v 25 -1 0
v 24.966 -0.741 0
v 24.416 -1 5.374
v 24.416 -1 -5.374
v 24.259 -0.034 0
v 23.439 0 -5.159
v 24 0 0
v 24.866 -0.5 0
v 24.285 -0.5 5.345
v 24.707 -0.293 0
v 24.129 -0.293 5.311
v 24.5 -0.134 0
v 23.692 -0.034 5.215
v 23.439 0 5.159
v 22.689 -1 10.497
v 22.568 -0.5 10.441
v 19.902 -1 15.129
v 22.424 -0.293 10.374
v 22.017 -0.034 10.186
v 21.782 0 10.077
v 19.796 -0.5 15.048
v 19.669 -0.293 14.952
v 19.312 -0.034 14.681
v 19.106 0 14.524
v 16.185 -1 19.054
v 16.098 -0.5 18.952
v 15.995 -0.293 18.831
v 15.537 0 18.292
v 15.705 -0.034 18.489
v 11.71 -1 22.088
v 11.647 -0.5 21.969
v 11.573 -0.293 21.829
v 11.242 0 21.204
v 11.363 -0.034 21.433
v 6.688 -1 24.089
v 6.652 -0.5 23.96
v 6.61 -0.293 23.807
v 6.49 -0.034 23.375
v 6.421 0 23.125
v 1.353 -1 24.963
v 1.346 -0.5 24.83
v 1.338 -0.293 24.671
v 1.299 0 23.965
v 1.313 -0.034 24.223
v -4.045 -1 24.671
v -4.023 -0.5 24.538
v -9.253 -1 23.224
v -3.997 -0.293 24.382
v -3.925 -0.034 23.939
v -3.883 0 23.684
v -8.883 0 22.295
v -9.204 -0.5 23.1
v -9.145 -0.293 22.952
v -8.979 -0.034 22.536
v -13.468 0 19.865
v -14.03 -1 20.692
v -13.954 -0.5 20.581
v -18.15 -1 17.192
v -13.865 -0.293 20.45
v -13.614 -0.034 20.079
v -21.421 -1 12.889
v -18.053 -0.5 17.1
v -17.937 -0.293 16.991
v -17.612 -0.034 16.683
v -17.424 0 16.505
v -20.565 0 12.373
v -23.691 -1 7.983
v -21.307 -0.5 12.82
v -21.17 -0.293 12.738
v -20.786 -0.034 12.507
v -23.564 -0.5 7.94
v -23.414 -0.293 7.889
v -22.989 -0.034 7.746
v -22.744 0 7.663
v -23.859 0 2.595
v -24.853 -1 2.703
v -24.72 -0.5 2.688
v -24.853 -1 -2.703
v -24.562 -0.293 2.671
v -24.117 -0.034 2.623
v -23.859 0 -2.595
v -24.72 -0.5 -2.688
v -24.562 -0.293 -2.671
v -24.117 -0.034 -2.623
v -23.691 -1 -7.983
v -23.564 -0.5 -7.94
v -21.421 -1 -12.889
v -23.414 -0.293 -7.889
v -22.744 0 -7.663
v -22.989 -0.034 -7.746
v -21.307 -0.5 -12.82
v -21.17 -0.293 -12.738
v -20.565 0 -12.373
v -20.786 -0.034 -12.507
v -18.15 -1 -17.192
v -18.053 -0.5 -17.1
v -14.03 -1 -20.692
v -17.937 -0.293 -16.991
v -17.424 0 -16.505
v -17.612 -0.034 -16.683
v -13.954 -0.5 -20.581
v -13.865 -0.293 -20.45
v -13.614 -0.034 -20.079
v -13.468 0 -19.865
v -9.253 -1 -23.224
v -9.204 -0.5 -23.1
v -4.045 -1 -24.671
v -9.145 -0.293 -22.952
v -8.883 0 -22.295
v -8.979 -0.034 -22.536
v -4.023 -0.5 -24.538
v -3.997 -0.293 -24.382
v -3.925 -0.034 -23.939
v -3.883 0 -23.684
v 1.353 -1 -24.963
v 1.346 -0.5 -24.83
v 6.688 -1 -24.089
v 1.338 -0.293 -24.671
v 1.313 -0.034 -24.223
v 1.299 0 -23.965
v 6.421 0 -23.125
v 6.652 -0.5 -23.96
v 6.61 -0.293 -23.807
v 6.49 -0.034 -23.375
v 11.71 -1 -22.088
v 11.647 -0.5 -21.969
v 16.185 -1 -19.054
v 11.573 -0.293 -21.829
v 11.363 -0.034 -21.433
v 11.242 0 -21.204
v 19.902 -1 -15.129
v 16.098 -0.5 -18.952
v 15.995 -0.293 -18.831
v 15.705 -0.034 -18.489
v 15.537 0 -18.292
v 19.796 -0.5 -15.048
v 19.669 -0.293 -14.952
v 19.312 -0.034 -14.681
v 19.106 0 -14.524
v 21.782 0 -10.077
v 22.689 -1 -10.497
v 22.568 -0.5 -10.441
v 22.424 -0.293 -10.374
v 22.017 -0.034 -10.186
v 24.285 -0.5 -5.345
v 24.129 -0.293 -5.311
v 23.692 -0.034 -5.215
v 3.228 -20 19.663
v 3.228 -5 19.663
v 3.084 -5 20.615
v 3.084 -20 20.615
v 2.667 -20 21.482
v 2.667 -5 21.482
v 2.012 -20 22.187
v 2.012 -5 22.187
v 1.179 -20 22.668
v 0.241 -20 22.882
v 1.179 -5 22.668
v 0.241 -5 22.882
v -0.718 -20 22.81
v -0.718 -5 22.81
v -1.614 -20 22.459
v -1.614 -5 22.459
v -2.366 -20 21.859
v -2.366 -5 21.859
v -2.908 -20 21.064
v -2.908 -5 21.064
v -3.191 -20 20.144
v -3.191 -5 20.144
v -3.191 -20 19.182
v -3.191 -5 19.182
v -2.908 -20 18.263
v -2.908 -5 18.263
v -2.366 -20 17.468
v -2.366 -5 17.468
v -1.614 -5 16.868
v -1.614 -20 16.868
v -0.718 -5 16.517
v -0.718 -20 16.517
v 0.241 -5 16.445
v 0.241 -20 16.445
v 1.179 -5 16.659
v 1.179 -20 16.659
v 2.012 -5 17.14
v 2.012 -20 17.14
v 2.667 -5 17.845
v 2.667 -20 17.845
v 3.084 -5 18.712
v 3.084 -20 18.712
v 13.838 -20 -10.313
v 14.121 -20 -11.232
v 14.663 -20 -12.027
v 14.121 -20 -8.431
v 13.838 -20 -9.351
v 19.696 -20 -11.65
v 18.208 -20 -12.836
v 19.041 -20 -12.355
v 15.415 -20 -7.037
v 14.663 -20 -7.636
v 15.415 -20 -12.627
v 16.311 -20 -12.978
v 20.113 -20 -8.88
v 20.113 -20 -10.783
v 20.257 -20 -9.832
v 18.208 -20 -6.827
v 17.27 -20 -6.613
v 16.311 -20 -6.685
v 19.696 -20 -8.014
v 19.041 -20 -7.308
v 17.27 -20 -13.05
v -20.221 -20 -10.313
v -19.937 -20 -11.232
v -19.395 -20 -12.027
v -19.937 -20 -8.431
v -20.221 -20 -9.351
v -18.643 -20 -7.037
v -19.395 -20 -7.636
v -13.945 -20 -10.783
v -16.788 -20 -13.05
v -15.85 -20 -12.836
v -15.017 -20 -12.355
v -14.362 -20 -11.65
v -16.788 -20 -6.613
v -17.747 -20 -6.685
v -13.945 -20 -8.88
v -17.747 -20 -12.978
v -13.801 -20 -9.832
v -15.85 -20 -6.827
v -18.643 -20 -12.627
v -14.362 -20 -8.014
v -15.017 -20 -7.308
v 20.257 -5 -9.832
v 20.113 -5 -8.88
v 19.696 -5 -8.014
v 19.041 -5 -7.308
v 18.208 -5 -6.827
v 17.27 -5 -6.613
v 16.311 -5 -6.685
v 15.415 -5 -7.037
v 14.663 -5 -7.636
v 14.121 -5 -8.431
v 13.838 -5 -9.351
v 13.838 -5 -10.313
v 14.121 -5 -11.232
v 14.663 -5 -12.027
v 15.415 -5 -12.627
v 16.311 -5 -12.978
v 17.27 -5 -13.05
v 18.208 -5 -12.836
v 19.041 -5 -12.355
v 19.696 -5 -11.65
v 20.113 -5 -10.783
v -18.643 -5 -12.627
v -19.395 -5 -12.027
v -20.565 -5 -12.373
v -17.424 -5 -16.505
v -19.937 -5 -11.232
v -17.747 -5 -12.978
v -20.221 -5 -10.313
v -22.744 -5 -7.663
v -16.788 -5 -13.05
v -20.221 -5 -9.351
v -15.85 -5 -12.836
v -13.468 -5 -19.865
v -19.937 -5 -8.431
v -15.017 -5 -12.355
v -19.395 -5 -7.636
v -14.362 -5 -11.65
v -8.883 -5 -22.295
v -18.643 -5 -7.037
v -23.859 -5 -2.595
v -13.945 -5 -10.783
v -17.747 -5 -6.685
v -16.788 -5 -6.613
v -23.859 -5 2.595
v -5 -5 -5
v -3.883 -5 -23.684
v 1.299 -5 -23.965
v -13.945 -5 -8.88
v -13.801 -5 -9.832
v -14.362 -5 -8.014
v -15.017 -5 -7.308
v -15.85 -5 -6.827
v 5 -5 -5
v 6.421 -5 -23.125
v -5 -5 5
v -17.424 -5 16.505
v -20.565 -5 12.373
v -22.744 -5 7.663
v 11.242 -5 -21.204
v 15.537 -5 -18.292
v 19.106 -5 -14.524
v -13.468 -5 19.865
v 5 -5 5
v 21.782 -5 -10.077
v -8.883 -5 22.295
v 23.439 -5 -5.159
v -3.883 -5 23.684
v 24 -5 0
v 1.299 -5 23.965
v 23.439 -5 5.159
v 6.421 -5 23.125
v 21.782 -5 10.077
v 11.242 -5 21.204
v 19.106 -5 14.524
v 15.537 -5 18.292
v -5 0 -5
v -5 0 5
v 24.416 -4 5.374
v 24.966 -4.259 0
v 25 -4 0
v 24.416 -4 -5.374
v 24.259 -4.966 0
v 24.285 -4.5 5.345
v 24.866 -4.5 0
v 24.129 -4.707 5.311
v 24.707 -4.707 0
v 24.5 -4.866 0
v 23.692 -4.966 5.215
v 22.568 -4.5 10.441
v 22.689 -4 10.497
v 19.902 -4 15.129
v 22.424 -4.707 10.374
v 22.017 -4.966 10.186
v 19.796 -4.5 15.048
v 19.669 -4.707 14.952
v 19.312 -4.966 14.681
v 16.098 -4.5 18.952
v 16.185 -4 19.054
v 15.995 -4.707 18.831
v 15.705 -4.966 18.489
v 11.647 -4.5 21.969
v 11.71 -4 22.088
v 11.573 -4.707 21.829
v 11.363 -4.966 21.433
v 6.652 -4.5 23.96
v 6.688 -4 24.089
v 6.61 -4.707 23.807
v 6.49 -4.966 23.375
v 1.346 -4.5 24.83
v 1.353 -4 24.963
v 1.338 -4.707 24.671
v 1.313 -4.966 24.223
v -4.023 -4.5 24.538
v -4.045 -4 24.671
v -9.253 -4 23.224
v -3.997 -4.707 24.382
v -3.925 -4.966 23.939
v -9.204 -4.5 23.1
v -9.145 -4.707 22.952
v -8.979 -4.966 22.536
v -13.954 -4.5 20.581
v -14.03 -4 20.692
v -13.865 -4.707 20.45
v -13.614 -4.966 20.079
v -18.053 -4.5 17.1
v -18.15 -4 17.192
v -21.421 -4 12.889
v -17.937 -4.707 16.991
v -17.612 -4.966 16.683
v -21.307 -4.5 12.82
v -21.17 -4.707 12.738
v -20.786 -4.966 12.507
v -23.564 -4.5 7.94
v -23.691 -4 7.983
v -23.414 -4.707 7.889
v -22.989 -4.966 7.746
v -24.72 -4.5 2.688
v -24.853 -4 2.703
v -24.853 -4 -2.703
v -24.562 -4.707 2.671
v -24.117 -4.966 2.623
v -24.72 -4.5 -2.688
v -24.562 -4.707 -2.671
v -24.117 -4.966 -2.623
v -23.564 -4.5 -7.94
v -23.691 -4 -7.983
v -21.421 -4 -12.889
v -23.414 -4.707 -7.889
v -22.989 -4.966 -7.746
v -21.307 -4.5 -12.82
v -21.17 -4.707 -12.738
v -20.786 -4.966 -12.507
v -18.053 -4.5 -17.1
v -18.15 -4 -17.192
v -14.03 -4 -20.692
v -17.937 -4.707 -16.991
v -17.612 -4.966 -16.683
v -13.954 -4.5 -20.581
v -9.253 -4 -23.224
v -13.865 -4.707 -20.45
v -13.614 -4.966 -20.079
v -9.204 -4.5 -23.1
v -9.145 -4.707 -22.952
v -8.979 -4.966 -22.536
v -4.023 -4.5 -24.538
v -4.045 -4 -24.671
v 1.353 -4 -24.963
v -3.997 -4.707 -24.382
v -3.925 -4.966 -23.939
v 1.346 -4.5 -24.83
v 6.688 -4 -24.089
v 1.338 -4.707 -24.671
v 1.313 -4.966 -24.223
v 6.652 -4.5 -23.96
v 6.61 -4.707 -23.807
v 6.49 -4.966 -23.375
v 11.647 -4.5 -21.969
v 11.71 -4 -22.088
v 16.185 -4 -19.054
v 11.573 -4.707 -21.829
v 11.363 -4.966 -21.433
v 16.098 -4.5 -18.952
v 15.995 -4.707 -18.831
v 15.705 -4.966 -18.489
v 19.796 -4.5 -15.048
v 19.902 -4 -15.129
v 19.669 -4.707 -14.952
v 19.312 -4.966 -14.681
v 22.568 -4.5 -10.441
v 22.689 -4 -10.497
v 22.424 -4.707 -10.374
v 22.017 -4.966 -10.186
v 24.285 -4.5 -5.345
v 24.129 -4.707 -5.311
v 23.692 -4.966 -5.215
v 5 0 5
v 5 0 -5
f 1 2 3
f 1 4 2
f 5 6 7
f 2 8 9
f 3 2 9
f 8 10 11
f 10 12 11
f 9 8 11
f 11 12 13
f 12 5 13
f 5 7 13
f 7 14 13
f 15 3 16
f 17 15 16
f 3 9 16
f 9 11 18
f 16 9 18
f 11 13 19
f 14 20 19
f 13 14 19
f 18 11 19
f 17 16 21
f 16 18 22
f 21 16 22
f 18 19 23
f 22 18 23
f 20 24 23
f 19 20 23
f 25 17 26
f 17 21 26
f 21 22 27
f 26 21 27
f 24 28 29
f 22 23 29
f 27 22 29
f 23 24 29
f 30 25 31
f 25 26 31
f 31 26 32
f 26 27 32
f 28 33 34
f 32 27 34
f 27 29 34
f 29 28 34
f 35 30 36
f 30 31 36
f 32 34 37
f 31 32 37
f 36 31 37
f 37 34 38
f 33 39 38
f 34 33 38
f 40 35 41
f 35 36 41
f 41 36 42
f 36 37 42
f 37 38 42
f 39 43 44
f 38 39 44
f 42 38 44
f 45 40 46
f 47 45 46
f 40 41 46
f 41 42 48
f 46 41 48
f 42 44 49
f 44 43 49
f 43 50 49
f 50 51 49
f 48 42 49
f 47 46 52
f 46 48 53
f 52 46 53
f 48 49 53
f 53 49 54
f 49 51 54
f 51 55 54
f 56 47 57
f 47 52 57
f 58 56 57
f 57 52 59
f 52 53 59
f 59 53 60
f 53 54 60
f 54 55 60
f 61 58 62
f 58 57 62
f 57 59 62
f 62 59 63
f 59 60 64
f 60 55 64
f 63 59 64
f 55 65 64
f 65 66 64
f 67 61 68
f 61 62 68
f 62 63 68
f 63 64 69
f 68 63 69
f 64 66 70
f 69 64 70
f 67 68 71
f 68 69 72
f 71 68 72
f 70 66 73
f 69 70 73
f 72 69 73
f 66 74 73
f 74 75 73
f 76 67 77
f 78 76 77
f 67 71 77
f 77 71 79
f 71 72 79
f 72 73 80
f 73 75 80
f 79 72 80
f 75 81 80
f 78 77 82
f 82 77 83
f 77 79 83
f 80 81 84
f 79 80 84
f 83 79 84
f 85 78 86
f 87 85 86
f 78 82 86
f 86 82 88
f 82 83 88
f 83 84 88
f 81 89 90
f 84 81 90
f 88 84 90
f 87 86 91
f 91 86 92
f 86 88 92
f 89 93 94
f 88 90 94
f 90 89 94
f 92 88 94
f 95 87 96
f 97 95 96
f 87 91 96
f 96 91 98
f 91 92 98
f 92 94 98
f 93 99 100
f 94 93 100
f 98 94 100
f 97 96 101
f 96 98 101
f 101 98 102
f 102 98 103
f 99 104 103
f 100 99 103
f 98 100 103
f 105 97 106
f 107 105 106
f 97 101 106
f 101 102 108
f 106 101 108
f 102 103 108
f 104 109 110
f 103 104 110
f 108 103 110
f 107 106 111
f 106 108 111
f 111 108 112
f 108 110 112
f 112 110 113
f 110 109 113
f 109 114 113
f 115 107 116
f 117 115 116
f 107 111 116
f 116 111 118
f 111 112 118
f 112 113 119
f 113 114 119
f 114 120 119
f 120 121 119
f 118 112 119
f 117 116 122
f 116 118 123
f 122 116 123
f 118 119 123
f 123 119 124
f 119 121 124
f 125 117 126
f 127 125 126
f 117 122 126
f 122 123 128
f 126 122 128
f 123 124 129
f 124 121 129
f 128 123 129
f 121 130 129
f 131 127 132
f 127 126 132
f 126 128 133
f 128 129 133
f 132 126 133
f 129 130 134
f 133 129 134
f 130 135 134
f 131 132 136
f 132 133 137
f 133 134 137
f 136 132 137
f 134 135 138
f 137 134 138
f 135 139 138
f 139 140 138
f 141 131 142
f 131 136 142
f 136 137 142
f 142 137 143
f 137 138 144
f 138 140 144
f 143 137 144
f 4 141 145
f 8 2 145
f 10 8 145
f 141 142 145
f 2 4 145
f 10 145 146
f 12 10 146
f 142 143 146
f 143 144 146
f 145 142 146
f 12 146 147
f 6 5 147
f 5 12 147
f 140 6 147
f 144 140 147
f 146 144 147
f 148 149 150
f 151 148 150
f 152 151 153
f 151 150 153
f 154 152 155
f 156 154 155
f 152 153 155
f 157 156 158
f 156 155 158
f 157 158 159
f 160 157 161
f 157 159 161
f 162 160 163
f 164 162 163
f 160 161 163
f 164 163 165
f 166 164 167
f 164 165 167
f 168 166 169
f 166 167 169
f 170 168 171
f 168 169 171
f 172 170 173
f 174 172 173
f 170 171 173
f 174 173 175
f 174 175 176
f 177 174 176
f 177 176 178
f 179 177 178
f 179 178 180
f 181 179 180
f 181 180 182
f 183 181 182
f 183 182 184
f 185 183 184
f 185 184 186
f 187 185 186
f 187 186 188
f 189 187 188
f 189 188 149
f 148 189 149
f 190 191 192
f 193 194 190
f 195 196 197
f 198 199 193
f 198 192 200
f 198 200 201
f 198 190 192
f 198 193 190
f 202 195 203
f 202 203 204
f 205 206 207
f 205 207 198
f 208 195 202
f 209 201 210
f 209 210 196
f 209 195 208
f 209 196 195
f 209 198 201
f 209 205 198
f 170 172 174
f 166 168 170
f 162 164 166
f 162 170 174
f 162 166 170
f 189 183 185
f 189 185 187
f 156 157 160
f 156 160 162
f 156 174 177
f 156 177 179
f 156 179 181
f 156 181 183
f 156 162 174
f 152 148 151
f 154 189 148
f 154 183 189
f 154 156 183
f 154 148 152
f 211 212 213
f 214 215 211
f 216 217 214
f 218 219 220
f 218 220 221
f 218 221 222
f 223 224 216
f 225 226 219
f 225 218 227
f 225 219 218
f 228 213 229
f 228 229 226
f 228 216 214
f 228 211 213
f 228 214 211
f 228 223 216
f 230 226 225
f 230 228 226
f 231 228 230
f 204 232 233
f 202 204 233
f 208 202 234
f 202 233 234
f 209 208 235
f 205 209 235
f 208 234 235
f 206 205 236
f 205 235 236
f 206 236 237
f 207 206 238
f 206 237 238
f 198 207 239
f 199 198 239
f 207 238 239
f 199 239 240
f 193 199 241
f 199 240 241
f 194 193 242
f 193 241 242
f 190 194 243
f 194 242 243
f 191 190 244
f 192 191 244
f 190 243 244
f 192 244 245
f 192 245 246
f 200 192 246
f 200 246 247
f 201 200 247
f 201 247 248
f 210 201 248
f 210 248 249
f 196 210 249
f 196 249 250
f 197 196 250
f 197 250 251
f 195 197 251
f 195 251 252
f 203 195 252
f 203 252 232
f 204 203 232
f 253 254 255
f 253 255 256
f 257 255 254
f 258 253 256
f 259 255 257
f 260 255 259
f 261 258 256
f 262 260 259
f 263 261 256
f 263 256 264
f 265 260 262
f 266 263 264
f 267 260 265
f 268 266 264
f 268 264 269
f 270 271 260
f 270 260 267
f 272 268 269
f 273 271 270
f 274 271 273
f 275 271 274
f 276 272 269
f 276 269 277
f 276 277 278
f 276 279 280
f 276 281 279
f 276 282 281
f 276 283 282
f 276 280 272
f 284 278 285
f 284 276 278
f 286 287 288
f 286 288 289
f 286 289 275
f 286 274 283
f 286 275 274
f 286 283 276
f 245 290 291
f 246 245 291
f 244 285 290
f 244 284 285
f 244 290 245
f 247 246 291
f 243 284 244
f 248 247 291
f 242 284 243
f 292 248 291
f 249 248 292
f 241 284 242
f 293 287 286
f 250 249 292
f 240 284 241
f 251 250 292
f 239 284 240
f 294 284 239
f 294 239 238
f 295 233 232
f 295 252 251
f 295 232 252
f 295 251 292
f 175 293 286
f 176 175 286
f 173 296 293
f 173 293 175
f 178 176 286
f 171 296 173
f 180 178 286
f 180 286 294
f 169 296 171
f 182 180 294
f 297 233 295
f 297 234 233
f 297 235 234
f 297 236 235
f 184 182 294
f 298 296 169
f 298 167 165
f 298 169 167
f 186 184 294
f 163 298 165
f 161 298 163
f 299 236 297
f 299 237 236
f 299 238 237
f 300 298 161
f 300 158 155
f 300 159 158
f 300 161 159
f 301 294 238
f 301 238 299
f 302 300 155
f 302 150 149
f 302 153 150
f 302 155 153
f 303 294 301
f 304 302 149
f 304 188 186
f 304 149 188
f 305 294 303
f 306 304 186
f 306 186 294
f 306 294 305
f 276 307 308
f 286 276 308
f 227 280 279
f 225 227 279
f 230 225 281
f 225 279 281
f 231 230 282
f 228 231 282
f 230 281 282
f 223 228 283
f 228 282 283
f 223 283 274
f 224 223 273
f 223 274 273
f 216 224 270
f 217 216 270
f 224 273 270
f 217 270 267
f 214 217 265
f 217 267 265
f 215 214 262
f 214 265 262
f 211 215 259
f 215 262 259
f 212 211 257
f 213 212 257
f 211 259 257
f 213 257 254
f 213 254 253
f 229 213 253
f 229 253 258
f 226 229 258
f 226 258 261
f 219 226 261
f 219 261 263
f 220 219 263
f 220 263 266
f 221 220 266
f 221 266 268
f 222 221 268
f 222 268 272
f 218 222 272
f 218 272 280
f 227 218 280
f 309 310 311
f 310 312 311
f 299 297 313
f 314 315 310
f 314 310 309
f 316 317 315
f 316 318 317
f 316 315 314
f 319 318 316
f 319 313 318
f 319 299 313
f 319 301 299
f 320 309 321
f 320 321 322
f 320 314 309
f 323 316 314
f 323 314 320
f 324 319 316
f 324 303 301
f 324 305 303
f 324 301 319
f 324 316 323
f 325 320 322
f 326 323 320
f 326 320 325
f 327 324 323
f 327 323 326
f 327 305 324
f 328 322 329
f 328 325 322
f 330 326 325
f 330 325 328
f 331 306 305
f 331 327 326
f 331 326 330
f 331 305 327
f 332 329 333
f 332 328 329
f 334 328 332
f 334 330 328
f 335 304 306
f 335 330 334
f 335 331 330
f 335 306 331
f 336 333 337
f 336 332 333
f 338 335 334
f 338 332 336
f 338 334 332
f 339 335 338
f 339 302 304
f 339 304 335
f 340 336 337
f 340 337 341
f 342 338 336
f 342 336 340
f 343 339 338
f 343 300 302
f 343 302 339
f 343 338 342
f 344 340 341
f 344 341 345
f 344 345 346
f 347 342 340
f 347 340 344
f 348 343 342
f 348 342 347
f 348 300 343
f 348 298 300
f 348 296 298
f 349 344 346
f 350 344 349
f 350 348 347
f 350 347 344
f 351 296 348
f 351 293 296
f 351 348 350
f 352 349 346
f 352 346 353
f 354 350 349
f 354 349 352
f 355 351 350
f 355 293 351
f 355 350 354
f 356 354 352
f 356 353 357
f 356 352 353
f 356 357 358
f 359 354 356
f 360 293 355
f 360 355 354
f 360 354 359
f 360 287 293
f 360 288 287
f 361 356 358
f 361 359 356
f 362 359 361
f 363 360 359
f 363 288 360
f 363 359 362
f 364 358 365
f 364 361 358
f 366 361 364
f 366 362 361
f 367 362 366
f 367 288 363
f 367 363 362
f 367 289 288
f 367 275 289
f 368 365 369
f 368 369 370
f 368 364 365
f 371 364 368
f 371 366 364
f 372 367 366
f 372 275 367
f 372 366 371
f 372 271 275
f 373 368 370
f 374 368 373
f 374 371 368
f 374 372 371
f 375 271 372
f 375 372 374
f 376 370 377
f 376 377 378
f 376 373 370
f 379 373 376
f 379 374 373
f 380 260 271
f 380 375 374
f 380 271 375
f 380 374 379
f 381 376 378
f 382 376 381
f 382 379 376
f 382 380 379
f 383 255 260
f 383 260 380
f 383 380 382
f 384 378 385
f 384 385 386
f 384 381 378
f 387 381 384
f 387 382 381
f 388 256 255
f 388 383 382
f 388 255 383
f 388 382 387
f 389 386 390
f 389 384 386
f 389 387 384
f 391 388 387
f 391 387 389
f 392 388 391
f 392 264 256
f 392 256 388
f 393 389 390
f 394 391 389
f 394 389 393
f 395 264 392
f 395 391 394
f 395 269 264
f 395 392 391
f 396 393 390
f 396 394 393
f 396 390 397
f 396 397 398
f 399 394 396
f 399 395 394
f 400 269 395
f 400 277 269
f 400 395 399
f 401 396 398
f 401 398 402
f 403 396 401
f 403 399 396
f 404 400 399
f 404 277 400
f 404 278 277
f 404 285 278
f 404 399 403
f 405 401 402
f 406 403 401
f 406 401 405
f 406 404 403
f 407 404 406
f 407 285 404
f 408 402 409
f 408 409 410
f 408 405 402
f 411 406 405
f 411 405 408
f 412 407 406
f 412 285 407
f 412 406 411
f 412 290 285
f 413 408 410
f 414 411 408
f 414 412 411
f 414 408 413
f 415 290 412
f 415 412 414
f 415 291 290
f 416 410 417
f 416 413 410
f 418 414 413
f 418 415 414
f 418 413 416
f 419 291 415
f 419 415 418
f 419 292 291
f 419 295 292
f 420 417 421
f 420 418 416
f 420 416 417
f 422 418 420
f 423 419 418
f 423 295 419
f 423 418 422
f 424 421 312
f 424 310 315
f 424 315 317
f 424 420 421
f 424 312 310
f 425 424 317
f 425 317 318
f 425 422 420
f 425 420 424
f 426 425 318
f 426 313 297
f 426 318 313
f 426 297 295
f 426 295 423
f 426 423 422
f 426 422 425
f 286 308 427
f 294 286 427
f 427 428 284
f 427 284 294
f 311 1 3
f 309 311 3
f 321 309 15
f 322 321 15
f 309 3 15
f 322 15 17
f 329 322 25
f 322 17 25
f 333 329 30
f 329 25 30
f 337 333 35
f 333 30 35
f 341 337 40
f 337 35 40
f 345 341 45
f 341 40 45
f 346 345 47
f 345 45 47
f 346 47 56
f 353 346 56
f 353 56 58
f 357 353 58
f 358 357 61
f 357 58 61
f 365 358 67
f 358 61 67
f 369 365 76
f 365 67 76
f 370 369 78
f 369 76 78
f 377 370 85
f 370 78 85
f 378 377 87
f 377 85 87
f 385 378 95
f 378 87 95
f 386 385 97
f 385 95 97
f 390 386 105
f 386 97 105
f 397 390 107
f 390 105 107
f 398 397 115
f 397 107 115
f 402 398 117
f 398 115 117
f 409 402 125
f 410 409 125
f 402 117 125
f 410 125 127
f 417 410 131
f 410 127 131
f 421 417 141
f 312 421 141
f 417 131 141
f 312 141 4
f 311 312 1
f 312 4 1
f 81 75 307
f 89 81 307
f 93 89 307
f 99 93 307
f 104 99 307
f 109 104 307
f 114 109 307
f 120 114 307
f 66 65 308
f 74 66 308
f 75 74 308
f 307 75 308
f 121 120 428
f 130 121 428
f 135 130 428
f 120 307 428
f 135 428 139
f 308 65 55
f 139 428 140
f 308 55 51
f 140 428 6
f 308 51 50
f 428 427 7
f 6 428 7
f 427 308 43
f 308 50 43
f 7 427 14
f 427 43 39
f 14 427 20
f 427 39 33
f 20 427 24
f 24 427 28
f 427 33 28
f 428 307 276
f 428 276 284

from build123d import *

# Parameters (mm, degrees)
F0_R     = 3.2275405411
F1_DEPTH = 20
F0_R_2   = 25
F0_W     = 10
F0_H     = 10
F2_DEPTH = 5
F3_R     = 1


with BuildPart() as f1:
    # F0 (on Front) → F1 (new body)
    with BuildSketch(Plane.XZ):
        with Locations((17.0290375666, -9.8317194231)):
            Circle(F0_R)
    extrude(amount=F1_DEPTH)



with BuildPart() as f1b:
    # F0 (on Front) → F1, piece 2 (new body)
    with BuildSketch(Plane.XZ):
        with Locations((-17.0290375666, -9.8317194231)):
            Circle(F0_R)
    extrude(amount=F1_DEPTH)


with BuildPart() as f1c:
    # F0 (on Front) → F1, piece 3 (new body)
    with BuildSketch(Plane.XZ):
        with Locations((0, 19.6634388463)):
            Circle(F0_R)
    extrude(amount=F1_DEPTH)


with BuildPart() as f1_1:
    add(f1.part)

    add(f1b.part)  # F2 merges F1b

    add(f1c.part)  # F2 merges F1c
    # F0 (on Front) → F2 (join)
    with BuildSketch(Plane.XZ):
        Circle(F0_R_2)
        with Locations((-17.0290375666, -9.8317194231)):
            Circle(F0_R, mode=Mode.SUBTRACT)
        with Locations((17.0290375666, -9.8317194231)):
            Circle(F0_R, mode=Mode.SUBTRACT)
        Rectangle(F0_W, F0_H, mode=Mode.SUBTRACT)
        with Locations((0, 19.6634388463)):
            Circle(F0_R, mode=Mode.SUBTRACT)
    extrude(amount=F2_DEPTH)

    # F3
    f3_edges = [f1_1.edges().sort_by_distance(p)[0] for p in [
        (-25, 0, 0),
        (-25, -5, 0),
    ]]
    fillet(f3_edges, radius=F3_R)


solid = f1_1.part
